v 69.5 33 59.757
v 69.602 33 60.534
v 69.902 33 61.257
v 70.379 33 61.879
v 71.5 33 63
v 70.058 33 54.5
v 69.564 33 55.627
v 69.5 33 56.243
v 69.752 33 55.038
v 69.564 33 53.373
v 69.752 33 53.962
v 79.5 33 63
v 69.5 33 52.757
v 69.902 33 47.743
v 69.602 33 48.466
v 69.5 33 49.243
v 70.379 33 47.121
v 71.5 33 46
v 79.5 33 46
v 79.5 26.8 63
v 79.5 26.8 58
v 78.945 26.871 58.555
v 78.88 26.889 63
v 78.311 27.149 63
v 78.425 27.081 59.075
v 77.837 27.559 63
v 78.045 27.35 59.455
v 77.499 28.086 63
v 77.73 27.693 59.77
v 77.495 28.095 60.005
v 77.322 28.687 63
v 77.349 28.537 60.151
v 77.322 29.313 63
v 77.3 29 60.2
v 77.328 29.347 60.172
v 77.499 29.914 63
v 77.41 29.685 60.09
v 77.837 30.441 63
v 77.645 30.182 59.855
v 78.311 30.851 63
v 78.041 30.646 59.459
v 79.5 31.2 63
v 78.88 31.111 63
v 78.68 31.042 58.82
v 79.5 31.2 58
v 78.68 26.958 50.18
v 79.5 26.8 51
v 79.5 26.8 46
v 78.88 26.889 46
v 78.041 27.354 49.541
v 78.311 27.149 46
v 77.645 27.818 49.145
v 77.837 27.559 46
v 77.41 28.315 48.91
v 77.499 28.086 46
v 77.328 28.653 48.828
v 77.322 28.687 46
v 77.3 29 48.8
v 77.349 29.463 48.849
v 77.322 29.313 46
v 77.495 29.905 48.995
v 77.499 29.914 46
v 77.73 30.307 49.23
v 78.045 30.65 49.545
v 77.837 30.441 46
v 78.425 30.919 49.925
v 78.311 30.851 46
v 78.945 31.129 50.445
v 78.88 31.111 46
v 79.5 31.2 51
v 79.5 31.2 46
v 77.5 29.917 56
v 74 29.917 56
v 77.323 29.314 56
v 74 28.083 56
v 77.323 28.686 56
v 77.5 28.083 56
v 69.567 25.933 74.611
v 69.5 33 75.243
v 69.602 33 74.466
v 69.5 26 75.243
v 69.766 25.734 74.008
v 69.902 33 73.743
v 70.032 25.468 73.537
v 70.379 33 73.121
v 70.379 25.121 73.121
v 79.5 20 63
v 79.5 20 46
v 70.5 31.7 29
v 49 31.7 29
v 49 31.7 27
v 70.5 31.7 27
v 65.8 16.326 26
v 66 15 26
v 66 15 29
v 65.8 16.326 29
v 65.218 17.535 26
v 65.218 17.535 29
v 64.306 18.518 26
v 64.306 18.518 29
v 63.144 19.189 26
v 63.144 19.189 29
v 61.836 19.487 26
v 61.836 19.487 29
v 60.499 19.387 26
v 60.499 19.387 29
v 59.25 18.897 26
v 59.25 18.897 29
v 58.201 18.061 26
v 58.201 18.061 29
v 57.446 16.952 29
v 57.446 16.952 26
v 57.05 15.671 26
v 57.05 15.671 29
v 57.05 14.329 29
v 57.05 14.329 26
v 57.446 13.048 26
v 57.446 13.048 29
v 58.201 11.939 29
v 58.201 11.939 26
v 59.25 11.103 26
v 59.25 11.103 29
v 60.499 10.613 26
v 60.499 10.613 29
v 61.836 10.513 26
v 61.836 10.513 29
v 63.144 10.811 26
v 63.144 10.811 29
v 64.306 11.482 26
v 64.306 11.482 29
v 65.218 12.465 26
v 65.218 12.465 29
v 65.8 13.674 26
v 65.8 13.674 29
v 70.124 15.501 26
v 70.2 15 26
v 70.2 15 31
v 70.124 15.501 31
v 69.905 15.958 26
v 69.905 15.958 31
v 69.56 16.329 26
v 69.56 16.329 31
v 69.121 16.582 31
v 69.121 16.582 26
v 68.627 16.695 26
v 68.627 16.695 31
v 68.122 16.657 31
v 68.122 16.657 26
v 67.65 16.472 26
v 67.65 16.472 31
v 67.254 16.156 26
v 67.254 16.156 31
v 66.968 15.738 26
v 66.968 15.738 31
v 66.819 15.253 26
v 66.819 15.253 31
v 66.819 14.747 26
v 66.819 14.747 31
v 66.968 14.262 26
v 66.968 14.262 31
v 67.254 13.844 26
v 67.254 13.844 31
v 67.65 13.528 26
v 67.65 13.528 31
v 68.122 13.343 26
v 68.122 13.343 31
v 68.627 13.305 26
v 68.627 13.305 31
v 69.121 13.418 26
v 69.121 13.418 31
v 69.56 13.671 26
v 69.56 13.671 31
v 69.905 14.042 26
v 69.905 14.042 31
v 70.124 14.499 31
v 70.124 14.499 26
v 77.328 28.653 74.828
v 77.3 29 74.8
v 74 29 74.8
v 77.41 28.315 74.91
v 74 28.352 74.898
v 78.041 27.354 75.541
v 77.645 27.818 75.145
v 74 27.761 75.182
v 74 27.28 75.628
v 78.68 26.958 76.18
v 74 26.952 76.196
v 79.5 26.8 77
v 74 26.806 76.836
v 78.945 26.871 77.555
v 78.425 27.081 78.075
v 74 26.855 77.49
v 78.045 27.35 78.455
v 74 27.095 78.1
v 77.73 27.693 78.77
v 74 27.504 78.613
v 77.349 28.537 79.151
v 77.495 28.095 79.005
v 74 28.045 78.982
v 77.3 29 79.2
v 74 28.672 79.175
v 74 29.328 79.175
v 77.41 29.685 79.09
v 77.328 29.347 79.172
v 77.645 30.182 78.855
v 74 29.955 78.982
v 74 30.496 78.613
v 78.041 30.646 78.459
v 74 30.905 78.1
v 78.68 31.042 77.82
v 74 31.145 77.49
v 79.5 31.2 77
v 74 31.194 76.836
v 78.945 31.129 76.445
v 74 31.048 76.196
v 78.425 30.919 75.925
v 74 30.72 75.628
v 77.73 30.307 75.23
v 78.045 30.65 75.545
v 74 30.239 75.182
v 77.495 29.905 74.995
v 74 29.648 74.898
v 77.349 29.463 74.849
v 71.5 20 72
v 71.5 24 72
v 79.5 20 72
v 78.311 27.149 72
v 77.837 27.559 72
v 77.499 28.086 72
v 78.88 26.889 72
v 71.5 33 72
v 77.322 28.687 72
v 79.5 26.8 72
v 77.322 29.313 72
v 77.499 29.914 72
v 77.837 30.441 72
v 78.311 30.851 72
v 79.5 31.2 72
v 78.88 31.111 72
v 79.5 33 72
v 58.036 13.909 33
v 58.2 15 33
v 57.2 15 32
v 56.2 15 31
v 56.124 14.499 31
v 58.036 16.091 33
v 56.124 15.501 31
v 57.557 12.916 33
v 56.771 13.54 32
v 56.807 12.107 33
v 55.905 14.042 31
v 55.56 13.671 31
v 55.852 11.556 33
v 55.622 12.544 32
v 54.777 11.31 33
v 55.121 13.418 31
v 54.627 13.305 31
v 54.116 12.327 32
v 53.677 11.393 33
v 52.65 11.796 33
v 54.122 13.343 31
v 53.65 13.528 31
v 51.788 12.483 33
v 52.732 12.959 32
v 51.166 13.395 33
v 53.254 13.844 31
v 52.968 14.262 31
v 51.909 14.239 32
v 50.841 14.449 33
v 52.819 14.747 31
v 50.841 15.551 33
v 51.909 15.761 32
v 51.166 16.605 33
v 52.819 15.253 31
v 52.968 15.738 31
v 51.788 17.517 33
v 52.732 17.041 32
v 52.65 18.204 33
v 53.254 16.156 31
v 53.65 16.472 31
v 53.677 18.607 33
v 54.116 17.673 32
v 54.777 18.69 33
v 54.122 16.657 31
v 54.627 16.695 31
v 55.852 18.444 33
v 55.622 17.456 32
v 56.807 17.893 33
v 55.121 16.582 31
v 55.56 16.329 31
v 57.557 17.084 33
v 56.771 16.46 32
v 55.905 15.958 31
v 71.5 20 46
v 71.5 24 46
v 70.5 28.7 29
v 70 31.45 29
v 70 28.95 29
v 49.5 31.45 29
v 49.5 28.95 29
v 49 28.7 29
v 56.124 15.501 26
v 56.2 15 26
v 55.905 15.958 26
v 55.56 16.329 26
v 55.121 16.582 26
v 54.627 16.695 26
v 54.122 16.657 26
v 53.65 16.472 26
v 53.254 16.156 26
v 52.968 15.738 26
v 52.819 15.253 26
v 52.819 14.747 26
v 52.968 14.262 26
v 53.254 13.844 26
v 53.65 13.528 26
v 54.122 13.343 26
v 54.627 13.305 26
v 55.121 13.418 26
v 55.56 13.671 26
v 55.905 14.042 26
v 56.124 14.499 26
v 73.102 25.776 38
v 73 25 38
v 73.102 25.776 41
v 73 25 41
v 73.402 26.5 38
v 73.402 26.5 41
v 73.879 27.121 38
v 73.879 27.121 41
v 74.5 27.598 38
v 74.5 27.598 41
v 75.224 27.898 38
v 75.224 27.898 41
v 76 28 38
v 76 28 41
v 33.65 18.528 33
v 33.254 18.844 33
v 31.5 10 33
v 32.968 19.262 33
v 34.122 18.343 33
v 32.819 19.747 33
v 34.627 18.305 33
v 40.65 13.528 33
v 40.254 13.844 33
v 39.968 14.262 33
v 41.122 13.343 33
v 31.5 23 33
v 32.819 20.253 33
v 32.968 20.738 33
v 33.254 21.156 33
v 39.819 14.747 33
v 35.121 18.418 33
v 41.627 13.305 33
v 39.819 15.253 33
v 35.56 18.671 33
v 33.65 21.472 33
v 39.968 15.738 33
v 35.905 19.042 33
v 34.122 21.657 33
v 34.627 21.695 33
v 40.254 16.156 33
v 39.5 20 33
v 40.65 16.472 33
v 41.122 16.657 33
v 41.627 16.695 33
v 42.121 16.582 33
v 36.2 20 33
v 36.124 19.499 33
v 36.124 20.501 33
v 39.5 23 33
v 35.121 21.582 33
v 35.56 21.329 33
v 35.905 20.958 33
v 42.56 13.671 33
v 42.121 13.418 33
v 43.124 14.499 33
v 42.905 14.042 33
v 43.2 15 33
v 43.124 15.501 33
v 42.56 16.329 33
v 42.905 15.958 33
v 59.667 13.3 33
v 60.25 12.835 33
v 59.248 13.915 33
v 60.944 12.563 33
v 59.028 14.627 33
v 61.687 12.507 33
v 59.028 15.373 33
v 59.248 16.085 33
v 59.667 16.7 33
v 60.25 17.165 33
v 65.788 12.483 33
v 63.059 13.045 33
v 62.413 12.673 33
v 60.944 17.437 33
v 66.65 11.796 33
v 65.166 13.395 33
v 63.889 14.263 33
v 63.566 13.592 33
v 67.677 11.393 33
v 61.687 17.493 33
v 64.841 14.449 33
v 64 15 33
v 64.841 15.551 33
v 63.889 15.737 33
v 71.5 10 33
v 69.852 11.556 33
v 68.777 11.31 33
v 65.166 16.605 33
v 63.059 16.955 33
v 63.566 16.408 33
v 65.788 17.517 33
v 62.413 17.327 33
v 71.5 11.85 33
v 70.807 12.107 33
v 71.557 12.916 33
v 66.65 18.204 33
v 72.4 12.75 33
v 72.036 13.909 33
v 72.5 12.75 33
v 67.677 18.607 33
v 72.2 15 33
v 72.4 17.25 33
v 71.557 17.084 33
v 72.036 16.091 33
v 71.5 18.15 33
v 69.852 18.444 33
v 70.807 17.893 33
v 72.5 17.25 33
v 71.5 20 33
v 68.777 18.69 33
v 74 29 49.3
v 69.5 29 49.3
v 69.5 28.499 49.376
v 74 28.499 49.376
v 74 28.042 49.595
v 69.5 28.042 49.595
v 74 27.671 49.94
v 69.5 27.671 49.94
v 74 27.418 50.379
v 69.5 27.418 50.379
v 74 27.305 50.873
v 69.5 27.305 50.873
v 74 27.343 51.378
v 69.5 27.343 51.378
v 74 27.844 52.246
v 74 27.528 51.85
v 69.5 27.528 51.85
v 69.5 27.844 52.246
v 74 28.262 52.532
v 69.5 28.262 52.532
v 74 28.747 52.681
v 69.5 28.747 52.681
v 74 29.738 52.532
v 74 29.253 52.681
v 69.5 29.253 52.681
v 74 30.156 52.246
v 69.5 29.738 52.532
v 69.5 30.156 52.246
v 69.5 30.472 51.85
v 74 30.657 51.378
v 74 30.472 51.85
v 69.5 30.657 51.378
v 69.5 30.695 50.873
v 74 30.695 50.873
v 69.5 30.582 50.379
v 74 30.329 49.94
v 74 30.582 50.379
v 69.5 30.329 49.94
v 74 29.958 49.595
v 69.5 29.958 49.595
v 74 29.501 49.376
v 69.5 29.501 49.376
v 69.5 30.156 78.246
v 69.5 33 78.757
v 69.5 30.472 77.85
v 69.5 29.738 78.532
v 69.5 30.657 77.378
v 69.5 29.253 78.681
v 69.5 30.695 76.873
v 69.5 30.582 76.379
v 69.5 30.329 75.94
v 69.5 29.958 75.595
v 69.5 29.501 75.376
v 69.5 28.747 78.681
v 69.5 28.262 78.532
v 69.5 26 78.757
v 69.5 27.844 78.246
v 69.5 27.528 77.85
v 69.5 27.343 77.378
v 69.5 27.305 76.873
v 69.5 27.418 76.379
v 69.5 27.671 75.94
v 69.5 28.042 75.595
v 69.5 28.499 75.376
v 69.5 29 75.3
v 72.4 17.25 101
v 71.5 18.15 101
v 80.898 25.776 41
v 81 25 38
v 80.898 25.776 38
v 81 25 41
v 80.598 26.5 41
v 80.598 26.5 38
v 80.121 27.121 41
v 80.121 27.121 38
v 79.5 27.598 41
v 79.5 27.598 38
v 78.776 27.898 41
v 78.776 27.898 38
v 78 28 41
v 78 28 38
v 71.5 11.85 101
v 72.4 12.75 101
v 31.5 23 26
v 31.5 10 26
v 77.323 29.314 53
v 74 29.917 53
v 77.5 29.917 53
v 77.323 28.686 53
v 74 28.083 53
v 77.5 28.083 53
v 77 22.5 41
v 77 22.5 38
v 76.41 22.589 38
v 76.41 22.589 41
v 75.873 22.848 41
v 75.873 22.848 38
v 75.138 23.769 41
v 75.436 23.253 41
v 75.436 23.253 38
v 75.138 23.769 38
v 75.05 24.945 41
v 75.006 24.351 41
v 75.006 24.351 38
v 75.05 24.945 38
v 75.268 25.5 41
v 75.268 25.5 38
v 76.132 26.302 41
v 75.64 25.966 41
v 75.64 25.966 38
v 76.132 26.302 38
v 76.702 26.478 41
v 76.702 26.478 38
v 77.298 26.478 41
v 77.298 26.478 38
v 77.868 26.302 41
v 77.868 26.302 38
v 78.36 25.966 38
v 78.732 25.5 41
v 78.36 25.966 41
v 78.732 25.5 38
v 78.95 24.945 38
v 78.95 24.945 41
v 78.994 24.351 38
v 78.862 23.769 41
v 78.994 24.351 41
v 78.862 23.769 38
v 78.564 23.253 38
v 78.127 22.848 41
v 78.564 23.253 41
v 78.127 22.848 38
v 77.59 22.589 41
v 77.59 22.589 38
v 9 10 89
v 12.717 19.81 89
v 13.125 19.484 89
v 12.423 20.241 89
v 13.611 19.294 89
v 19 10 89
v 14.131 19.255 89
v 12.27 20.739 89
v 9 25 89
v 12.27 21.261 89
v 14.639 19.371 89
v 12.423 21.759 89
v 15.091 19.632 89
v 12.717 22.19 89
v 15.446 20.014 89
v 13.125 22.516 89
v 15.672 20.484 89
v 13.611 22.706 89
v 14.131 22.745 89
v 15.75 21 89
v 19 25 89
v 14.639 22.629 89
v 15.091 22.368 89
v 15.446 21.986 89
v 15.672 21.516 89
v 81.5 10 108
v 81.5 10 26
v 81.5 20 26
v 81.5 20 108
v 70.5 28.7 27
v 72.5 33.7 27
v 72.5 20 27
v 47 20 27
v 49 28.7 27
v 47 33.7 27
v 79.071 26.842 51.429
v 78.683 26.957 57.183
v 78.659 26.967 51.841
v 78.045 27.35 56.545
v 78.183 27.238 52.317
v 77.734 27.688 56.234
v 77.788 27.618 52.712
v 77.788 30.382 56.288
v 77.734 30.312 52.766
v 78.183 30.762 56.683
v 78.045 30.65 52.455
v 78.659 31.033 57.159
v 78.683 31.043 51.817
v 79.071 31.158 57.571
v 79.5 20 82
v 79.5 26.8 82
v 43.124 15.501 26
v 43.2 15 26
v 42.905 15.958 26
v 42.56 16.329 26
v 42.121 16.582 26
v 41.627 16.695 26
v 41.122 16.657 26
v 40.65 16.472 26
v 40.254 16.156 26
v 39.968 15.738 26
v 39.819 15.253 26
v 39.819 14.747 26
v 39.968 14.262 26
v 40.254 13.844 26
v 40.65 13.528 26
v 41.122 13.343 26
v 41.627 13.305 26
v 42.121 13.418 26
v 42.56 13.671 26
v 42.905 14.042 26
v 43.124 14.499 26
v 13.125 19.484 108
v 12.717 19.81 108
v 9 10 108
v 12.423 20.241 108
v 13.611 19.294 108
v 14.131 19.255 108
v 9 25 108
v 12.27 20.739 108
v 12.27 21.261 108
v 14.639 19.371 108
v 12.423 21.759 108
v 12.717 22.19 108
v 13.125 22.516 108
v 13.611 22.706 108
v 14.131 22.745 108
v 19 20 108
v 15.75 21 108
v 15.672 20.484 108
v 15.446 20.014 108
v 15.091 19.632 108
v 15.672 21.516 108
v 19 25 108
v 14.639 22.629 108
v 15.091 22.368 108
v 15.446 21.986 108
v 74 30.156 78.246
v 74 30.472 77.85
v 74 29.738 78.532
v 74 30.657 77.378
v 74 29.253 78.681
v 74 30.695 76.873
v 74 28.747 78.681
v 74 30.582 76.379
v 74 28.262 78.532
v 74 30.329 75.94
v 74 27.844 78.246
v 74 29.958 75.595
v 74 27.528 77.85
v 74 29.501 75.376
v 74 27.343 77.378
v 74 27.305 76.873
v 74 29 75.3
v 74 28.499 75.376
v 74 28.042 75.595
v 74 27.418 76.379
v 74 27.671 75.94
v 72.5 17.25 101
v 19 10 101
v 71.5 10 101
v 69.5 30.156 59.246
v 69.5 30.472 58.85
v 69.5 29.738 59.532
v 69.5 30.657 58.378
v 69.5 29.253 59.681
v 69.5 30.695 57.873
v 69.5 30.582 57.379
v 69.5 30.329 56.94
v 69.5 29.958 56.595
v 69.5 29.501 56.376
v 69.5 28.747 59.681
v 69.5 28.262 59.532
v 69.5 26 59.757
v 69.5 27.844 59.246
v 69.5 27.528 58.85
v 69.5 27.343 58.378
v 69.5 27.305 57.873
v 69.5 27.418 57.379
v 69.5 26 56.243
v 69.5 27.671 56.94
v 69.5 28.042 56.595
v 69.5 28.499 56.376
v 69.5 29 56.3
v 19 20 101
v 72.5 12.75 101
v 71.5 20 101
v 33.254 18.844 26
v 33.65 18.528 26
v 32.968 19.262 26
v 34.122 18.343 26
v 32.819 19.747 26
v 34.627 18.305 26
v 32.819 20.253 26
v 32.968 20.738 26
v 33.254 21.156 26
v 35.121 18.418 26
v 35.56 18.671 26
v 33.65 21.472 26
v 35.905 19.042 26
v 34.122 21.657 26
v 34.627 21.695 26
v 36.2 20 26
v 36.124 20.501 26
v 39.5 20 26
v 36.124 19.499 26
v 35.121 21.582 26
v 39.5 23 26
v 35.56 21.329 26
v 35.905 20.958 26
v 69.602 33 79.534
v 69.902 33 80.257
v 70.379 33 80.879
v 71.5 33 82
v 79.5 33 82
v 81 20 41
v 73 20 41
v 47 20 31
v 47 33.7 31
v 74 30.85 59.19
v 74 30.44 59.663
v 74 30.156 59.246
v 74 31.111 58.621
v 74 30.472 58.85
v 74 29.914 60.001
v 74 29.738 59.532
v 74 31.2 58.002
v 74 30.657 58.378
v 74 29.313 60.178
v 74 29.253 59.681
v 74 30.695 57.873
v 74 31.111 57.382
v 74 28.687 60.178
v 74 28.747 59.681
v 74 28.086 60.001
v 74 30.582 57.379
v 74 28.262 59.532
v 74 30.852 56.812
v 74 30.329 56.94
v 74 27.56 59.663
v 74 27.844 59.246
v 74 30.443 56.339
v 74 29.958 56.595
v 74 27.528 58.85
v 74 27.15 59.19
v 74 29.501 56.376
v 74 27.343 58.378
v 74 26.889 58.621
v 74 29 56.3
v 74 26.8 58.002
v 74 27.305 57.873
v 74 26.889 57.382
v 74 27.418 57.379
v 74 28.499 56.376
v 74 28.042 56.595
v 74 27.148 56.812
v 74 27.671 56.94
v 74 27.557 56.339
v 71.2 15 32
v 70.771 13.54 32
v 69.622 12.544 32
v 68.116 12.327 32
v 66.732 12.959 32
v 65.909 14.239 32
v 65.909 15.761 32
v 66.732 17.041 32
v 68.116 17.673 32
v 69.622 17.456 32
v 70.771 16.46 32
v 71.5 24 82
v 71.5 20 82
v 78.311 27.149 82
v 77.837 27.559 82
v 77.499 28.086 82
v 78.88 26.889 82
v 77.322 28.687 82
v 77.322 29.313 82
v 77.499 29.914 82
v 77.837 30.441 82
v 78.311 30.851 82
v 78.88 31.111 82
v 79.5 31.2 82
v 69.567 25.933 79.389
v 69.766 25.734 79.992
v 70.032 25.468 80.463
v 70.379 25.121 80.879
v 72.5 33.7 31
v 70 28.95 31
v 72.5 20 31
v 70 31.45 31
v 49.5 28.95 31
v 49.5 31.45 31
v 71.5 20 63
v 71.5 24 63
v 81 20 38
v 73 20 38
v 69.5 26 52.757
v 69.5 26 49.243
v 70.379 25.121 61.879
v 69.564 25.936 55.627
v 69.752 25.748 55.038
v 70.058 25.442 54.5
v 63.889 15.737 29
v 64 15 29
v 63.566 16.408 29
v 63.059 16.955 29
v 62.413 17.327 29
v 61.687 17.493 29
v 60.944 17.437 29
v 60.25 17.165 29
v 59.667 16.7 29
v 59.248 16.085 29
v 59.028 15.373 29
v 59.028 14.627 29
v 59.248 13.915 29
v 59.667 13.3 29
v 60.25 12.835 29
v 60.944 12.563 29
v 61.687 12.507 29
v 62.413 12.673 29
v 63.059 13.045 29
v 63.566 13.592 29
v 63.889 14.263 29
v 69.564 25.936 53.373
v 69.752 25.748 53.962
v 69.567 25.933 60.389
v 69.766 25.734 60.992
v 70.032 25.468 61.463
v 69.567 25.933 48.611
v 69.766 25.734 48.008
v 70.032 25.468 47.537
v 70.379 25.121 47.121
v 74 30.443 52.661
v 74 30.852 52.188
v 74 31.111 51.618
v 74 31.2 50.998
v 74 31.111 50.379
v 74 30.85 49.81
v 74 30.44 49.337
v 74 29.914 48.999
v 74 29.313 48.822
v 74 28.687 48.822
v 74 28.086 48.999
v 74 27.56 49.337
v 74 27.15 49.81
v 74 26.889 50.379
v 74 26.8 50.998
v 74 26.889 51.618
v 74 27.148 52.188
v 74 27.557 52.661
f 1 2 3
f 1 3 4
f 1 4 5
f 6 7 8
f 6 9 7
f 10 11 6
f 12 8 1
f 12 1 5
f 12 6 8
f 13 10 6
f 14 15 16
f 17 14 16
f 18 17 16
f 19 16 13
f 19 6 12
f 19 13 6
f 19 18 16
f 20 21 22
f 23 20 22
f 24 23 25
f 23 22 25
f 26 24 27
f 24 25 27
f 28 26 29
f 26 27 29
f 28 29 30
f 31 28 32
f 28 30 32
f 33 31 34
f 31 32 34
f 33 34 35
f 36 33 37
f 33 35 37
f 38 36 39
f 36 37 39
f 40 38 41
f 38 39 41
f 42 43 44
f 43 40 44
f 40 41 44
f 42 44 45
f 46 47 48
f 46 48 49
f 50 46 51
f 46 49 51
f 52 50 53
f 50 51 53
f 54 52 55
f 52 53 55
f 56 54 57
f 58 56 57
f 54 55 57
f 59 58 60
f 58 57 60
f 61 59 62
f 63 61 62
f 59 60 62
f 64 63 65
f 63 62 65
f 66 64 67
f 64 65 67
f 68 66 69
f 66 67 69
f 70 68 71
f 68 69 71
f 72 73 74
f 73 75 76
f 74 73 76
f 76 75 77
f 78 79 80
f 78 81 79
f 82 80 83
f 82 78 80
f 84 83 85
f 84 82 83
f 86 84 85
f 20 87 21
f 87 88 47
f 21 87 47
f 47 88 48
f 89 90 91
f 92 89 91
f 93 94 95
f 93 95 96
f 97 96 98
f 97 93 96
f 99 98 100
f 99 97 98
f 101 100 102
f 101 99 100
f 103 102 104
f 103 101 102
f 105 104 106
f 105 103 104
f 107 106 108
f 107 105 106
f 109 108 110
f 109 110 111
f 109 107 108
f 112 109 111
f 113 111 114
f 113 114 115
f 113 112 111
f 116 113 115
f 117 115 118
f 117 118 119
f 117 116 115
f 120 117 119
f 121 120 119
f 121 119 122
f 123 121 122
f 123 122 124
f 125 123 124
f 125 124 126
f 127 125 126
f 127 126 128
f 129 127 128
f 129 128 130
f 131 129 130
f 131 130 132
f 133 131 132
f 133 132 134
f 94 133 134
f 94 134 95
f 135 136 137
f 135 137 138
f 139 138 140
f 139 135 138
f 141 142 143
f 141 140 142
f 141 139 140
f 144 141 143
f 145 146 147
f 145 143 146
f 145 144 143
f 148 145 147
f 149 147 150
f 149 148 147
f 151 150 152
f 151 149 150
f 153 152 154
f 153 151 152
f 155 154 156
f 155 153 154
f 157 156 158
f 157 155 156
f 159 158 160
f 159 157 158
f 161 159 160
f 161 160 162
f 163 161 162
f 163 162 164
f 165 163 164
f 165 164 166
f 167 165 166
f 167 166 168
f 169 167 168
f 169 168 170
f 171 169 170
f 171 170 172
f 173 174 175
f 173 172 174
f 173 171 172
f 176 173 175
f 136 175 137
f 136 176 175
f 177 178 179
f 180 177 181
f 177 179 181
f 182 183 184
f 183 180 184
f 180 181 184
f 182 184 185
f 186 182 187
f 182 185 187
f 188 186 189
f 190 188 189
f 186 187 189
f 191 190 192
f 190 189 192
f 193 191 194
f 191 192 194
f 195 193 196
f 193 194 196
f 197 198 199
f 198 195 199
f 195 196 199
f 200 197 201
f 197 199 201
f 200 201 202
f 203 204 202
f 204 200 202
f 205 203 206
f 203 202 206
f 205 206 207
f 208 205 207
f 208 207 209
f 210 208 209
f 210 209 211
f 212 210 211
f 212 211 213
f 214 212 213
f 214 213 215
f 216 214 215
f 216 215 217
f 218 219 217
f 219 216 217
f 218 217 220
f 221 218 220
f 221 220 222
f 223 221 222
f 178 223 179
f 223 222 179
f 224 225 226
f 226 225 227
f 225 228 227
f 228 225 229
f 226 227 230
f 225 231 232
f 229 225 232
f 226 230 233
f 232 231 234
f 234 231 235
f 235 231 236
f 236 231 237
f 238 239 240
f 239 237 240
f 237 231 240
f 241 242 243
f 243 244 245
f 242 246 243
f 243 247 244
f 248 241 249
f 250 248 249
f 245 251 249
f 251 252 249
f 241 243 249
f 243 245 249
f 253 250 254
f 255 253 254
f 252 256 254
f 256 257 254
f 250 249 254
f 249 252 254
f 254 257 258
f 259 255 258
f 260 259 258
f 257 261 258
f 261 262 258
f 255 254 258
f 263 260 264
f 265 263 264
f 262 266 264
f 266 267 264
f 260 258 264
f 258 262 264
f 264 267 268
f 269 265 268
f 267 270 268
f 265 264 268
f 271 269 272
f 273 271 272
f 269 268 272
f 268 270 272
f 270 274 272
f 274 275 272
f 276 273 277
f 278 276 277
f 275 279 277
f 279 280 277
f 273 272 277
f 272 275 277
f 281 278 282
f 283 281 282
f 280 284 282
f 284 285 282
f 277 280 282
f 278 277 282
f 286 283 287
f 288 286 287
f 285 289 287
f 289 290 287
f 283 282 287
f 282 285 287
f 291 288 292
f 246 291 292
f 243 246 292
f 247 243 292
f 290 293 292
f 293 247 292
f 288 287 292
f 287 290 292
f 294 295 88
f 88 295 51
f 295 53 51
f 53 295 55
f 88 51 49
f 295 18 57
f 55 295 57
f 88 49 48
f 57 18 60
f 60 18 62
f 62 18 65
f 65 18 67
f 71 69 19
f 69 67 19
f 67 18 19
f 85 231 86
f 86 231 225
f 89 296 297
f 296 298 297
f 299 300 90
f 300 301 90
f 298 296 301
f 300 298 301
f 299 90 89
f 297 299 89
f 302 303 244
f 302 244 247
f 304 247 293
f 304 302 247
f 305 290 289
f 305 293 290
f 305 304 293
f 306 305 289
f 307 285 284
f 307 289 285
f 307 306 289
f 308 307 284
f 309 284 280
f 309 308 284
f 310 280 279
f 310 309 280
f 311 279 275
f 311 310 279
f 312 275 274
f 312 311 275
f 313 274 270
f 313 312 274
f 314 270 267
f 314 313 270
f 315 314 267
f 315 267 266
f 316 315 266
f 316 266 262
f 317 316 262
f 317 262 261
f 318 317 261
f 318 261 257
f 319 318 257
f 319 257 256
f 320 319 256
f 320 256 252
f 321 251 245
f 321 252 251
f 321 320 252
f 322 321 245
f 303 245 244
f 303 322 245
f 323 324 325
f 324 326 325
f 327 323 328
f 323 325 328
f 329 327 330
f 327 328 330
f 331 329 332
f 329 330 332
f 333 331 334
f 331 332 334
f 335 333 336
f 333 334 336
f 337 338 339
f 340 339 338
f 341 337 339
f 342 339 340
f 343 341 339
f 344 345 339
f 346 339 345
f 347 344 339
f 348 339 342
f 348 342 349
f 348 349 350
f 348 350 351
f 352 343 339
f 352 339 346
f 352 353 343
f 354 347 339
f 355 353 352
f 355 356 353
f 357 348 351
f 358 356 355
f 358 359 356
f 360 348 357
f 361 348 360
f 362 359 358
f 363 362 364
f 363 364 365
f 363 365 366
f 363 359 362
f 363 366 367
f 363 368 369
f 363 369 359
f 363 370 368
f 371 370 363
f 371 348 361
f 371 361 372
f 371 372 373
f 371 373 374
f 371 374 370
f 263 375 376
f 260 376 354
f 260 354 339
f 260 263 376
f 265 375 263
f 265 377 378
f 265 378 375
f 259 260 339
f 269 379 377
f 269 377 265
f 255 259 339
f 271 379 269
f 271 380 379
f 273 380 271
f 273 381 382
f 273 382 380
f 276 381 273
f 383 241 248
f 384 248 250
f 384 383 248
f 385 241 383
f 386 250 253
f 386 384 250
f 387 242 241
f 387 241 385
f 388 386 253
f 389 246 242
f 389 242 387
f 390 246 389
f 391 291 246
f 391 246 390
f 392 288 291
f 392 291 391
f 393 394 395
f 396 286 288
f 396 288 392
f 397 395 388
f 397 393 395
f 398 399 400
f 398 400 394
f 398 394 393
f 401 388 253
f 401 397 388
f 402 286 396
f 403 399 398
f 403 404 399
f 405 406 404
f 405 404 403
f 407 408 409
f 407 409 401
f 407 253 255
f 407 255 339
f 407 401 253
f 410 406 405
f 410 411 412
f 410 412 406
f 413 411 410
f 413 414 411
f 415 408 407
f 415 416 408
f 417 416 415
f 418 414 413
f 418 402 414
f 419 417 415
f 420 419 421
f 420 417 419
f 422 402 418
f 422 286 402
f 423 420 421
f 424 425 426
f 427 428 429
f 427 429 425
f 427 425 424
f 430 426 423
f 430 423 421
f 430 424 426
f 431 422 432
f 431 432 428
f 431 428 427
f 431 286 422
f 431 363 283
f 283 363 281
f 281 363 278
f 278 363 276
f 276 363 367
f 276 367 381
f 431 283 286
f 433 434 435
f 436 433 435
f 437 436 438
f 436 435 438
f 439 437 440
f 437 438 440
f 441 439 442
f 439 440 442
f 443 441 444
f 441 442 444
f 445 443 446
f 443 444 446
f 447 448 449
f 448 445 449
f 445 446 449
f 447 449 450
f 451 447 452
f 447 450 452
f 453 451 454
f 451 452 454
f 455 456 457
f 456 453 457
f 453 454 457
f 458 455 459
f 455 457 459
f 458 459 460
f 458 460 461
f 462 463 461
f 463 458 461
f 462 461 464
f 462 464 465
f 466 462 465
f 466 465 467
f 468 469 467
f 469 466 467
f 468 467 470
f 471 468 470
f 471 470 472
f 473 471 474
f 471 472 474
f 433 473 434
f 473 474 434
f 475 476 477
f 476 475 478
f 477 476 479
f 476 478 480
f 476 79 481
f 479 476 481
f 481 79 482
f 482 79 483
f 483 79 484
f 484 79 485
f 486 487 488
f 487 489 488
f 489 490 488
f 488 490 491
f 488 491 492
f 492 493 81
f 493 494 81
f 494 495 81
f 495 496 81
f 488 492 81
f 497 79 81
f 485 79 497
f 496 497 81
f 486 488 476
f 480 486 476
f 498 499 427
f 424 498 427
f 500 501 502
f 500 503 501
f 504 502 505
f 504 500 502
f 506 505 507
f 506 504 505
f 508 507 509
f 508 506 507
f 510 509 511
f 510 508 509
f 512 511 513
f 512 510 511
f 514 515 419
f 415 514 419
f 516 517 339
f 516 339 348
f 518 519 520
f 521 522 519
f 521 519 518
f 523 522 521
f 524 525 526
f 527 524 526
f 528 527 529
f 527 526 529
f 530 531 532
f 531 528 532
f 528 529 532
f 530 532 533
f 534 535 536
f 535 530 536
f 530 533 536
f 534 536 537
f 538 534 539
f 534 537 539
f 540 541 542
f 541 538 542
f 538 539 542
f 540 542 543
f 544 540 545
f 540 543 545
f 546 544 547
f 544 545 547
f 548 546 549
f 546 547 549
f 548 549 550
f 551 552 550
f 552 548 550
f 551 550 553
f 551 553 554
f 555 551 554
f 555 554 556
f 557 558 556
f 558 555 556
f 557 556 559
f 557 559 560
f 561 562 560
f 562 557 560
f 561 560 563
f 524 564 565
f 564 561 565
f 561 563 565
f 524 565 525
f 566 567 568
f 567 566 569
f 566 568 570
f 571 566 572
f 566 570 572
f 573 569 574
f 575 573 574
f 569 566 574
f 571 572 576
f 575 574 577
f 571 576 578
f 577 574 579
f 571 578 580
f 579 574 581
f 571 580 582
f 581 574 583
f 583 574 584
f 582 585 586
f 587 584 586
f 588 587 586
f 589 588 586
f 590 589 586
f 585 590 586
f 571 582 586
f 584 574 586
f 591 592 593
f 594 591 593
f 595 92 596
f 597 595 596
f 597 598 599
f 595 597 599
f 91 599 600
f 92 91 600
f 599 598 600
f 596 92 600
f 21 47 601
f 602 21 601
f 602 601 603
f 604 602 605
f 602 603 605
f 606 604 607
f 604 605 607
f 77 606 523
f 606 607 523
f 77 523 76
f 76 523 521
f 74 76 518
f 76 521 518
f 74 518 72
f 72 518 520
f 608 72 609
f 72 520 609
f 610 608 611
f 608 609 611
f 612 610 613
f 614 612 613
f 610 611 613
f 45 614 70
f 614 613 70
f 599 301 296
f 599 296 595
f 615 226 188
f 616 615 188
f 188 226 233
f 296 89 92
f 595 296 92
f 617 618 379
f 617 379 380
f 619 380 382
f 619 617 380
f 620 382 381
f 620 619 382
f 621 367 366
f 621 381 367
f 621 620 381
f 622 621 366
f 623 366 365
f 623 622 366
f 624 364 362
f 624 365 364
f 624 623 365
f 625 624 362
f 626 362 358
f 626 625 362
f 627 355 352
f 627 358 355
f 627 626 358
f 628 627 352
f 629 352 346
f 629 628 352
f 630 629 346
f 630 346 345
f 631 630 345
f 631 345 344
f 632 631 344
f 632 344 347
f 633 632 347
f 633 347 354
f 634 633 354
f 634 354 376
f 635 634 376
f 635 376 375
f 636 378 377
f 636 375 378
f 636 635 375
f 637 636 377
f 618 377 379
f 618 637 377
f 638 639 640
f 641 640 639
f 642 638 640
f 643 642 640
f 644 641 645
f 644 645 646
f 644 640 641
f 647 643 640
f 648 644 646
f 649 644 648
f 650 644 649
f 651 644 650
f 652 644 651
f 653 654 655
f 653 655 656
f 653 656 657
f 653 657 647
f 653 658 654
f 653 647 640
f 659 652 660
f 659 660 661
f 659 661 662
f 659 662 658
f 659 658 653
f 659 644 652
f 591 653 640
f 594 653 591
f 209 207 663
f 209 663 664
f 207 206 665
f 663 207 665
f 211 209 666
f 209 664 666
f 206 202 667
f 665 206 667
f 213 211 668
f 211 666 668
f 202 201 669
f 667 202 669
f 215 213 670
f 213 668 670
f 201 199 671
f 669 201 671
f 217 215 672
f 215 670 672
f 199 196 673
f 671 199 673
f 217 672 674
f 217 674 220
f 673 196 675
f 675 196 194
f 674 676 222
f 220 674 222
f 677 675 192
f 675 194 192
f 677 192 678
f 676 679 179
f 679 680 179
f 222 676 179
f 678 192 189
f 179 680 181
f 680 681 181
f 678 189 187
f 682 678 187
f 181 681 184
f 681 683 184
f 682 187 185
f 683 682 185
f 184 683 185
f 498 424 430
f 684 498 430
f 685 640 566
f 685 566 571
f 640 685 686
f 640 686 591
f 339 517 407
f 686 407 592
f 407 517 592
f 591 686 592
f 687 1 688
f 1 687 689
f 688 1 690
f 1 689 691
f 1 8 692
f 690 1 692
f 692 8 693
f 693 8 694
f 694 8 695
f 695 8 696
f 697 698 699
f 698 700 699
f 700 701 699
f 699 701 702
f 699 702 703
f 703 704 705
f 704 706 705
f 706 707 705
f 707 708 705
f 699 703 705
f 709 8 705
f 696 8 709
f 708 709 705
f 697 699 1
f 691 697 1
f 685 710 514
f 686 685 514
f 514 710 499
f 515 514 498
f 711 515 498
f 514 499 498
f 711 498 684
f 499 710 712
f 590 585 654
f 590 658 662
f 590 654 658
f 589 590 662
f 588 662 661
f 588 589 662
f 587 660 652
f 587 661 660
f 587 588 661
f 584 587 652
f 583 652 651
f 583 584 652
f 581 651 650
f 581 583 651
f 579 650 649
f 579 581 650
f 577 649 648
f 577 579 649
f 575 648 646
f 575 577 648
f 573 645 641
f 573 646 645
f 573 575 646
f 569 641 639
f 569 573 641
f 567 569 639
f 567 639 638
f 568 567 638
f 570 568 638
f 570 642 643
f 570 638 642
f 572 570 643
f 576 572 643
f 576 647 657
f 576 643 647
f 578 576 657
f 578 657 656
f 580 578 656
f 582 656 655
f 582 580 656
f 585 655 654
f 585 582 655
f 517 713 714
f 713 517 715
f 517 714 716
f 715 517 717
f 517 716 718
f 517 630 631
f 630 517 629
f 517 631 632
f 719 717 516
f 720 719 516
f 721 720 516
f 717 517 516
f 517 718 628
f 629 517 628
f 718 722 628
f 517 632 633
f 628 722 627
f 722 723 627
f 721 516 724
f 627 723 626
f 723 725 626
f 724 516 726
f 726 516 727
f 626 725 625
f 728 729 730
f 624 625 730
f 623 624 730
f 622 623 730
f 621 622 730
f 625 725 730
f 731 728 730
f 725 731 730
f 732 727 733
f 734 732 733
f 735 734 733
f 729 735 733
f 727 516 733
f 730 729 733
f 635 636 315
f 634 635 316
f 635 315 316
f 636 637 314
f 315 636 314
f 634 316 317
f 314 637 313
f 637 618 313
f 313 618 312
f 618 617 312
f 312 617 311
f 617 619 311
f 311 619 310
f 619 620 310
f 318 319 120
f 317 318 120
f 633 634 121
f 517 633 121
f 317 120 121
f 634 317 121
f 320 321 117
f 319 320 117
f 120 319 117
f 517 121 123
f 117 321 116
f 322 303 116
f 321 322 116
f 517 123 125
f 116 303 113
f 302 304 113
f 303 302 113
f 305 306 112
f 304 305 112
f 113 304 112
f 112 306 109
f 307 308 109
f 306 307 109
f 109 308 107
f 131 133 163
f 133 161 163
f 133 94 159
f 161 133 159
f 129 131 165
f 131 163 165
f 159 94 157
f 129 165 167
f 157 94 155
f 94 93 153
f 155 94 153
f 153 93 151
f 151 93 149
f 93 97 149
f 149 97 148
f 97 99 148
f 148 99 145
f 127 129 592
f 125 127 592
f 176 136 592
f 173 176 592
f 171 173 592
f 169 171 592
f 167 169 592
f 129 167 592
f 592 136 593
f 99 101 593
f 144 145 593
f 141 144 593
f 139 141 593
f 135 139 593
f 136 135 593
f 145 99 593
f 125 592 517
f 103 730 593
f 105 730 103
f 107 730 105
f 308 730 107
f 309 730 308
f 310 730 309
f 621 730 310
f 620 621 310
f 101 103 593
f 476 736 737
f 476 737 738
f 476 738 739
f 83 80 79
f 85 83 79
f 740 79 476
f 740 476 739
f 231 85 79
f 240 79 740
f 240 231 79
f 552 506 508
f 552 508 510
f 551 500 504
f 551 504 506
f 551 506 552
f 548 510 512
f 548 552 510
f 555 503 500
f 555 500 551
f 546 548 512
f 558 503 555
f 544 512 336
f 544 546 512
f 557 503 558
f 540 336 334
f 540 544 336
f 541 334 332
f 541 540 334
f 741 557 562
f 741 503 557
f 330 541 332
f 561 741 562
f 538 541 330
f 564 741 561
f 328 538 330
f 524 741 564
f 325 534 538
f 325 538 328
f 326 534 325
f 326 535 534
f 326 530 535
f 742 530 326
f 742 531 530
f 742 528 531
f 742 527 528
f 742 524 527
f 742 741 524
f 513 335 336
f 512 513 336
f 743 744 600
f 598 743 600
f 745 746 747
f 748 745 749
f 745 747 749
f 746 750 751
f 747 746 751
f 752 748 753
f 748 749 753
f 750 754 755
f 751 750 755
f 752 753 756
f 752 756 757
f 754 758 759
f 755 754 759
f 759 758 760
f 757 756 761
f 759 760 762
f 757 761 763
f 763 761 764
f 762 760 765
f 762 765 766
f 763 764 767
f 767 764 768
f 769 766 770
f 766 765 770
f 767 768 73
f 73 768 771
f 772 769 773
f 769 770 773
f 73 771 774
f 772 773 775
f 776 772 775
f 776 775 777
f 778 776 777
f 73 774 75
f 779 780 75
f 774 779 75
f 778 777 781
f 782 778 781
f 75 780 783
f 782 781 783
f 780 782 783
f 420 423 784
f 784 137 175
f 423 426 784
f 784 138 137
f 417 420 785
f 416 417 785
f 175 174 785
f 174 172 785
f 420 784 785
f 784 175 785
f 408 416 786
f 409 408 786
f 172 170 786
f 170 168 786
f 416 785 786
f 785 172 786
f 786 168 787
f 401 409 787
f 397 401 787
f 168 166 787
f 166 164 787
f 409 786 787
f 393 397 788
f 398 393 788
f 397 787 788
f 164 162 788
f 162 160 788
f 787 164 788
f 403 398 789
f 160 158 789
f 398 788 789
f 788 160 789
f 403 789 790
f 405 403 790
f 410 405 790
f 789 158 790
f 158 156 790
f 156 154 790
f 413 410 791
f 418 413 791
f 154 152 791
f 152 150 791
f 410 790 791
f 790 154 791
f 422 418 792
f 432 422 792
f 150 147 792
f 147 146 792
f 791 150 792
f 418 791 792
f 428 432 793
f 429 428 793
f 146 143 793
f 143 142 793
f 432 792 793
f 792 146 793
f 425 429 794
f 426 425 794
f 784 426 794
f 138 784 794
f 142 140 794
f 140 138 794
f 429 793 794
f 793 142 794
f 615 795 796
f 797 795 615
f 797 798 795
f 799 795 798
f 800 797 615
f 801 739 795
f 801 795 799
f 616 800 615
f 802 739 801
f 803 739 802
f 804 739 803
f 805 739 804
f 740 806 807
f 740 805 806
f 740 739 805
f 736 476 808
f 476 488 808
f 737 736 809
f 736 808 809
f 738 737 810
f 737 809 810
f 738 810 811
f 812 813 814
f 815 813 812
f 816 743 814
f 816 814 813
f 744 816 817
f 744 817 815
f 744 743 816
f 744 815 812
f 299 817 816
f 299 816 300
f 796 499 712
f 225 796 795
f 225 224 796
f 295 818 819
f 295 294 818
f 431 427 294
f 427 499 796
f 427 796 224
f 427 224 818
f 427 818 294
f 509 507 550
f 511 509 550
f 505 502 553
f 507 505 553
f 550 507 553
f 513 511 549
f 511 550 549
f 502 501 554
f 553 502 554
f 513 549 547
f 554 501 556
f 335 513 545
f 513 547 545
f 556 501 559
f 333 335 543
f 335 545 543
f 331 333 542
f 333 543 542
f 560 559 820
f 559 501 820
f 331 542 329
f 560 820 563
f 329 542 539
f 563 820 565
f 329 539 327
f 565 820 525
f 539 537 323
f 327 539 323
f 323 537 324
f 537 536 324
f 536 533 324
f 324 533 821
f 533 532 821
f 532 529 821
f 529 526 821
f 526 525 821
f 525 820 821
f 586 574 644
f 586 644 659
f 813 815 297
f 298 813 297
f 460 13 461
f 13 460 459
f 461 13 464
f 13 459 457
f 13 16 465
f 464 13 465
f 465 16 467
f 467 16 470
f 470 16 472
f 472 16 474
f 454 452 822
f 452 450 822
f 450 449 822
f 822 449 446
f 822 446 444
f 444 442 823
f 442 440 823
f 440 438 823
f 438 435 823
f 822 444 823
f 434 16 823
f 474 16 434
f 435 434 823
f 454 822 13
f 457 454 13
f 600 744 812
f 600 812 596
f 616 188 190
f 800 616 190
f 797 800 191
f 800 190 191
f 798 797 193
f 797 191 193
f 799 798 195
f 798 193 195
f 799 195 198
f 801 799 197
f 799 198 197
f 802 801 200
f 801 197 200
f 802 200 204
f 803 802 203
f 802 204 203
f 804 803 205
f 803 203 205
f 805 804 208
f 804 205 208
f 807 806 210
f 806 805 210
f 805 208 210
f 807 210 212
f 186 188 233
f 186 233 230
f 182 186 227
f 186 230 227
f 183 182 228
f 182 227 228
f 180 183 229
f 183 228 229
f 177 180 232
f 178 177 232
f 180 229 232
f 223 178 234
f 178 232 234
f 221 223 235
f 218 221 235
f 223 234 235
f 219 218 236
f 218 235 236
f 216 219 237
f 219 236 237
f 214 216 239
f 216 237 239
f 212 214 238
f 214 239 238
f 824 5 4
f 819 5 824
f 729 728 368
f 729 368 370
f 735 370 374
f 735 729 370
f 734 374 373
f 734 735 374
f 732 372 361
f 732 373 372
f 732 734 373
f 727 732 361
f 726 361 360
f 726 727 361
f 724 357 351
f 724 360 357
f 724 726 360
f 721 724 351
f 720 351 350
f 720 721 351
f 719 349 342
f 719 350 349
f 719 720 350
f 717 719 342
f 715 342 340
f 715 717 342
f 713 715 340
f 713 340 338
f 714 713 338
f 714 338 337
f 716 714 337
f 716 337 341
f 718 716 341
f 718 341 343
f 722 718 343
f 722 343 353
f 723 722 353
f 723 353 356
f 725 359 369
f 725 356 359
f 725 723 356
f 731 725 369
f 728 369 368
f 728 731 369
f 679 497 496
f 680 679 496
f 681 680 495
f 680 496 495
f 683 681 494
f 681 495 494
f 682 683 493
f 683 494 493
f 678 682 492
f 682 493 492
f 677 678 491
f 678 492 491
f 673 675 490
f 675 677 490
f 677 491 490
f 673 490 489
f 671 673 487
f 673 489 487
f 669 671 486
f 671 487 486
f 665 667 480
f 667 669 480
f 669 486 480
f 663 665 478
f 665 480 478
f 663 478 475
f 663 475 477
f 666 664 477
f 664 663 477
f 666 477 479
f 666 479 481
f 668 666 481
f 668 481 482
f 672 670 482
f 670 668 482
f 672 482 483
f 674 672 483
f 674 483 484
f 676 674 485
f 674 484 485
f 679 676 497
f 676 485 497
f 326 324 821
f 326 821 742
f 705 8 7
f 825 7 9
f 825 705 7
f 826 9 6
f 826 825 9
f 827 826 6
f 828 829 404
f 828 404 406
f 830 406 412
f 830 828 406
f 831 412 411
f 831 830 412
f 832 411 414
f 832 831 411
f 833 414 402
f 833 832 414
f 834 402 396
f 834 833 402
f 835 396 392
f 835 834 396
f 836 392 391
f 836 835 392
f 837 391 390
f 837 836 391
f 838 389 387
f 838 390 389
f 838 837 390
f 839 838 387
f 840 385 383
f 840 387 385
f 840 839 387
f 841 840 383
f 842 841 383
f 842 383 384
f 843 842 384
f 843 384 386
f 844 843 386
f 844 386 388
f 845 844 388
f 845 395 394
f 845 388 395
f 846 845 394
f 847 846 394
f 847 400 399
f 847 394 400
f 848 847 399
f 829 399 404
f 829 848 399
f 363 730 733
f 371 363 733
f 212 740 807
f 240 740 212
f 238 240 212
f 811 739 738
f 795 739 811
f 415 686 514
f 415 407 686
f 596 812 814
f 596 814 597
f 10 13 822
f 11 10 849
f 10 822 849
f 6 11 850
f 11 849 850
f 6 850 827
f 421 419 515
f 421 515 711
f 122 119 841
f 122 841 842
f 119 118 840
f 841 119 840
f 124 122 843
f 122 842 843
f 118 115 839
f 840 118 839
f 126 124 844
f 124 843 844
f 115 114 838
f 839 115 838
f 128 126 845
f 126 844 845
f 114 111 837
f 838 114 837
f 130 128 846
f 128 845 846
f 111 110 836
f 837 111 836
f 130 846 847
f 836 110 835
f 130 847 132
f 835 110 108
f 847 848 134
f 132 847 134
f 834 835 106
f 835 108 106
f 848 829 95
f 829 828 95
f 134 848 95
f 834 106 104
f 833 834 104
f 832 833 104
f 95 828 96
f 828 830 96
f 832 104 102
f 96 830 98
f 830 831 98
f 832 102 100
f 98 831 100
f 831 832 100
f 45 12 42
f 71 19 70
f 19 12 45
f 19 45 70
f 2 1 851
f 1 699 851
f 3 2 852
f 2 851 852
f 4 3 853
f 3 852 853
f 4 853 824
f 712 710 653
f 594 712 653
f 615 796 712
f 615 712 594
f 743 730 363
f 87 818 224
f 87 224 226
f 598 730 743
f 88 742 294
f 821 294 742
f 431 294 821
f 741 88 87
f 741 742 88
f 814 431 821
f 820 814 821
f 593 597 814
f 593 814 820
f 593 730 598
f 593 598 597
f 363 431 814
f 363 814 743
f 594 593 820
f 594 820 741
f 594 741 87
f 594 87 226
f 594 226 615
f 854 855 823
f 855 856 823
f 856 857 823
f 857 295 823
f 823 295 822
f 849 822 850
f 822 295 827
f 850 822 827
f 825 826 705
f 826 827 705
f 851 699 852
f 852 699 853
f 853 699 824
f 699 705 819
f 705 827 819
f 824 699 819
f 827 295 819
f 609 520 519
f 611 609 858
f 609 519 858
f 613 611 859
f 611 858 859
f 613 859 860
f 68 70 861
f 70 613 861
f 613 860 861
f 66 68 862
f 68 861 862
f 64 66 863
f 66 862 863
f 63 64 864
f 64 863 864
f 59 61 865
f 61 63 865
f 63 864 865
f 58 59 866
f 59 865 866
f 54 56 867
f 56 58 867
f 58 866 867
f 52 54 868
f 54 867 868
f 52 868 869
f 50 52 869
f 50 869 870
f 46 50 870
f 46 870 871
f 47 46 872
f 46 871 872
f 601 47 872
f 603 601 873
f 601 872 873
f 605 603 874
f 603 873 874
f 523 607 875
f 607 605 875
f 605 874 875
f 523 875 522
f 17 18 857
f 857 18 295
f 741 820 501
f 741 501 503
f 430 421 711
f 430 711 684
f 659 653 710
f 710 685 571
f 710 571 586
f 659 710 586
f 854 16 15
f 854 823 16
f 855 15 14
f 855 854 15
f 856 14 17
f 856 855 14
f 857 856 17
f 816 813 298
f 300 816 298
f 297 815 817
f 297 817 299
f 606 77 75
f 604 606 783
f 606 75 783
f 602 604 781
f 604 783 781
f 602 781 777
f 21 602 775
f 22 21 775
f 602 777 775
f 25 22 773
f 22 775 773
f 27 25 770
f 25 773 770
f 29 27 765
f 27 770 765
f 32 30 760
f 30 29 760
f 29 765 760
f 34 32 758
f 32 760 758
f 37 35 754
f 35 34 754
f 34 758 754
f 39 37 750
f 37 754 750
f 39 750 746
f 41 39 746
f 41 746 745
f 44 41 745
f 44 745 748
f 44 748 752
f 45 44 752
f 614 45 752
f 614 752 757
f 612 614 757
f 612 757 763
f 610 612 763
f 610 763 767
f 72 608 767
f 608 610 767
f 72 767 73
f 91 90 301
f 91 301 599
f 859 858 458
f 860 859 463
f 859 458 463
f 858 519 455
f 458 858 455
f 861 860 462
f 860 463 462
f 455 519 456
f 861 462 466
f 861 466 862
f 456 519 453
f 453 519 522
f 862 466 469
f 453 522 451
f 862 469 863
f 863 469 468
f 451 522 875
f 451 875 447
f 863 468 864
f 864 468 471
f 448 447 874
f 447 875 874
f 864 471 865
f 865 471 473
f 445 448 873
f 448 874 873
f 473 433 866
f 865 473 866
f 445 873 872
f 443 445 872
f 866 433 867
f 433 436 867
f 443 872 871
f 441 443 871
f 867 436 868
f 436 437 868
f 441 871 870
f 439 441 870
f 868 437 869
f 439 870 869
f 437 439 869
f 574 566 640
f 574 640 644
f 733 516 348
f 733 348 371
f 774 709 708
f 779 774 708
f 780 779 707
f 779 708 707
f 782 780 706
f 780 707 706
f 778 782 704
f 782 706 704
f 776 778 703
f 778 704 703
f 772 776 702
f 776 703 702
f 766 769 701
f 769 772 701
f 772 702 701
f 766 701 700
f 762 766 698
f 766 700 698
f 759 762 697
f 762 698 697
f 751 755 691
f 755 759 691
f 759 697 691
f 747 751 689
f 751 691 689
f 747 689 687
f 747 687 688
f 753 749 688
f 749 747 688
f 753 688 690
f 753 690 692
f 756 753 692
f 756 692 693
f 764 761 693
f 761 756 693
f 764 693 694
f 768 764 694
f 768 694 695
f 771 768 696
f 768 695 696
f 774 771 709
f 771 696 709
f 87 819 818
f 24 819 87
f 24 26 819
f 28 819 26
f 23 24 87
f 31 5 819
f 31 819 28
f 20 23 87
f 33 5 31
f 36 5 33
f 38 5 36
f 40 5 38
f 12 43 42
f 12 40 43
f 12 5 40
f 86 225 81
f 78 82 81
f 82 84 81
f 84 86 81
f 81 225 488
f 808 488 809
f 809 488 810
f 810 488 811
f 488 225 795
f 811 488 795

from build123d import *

# Parameters (mm, degrees)
BOX001027045198_W       = 10
BOX001027045198_H       = 2.5
BOX001027045198_DEPTH   = 20.5
BOX001027045197_W       = 10
BOX001027045197_H       = 3
BOX001027045197_DEPTH   = 21.5
BOX001027045196_W       = 4
BOX001027045196_H       = 14
BOX001027045196_DEPTH   = 25.5
CUT238_PITCH_ANGLE      = 90
CYLINDER070_R           = 1.7
CYLINDER070_DEPTH       = 50
CYLINDER069_R           = 1.7
CYLINDER069_DEPTH       = 50
CYLINDER068_R           = 1.7
CYLINDER068_DEPTH       = 50
CYLINDER067_R           = 1.7
CYLINDER067_DEPTH       = 50
CYLINDER063_R           = 2.5
CYLINDER063_DEPTH       = 50
CYLINDER064_R           = 4.5
CYLINDER064_DEPTH       = 4
BOX035_W                = 50
BOX035_H                = 10
BOX035_DEPTH            = 7
BOX034_W                = 10
BOX034_H                = 4.5
BOX034_DEPTH            = 122
BOX033_W                = 10
BOX033_H                = 10
BOX033_DEPTH            = 80
CHAMFER_SIZE            = 0.9
BOX041_W                = 8
BOX041_H                = 5
BOX041_DEPTH            = 7
CHAMFER017_SIZE         = 2
CYLINDER273_R           = 2
CYLINDER273_DEPTH       = 10
CYLINDER273_PITCH_ANGLE = 90
BOX001027045201_W       = 3
BOX001027045201_H       = 8
BOX001027045201_DEPTH   = 8
FILLET047_R             = 3
CUT246_PITCH_ANGLE      = -90
CUT246_PLACEMENT_ANGLE  = 90
BOX001027045204_W       = 8
BOX001027045204_H       = 6
BOX001027045204_DEPTH   = 17
BOX001027045205_W       = 8
BOX001027045205_H       = 6
BOX001027045205_DEPTH   = 10
CYLINDER272_R           = 2.2
CYLINDER272_DEPTH       = 30
CYLINDER271_R           = 2.2
CYLINDER271_DEPTH       = 30
CYLINDER271_PITCH_ANGLE = 90
CYLINDER270_R           = 1.7
CYLINDER270_DEPTH       = 30
CYLINDER270_PITCH_ANGLE = 90
BOX001027045200_W       = 10
BOX001027045200_H       = 9
BOX001027045200_DEPTH   = 10
CHAMFER015_SIZE         = 2
CHAMFER016_SIZE         = 2
FILLET046_R             = 3
CYLINDER275_R           = 1.75
CYLINDER275_DEPTH       = 200
BOX001027045203_W       = 10
BOX001027045203_H       = 15
BOX001027045203_DEPTH   = 19
BOX001027045202_W       = 68
BOX001027045202_H       = 10
BOX001027045202_DEPTH   = 7


with BuildPart() as cube244:
    # Box001027045198 → Box001027045198 (new body)
    with BuildSketch(Plane(origin=(63, 7.25, -46.5), x_dir=(1, 0, 0), z_dir=(0, 0, 1))):
        with Locations((5, 1.25)):
            Rectangle(BOX001027045198_W, BOX001027045198_H)
    extrude(amount=BOX001027045198_DEPTH)


with BuildPart() as pin_strip_hole:
    # Box001027045197 → Box001027045197 (new body)
    with BuildSketch(Plane(origin=(70, 7, -47), x_dir=(1, 0, 0), z_dir=(0, 0, 1))):
        with Locations((5, 1.5)):
            Rectangle(BOX001027045197_W, BOX001027045197_H)
    extrude(amount=BOX001027045197_DEPTH)

    # Fusion112152: union Cube244
    add(cube244.part)


with BuildPart() as pin_strip_hole_1:
    # Fusion112152 placement: moved
    add(pin_strip_hole.part.moved(Location((2, 0, 0))))


with BuildPart() as pin_strip_bracket:
    # Box001027045196 → Box001027045196 (new body)
    with BuildSketch(Plane(origin=(70, -2, -49), x_dir=(1, 0, 0), z_dir=(0, 0, 1))):
        with Locations((2, 7)):
            Rectangle(BOX001027045196_W, BOX001027045196_H)
    extrude(amount=BOX001027045196_DEPTH)

    # Cut238: cut pin-strip-hole
    add(pin_strip_hole_1.part, mode=Mode.SUBTRACT)


with BuildPart() as pin_strip_bracket_1:
    # Cut238 pitch: moved
    add(pin_strip_bracket.part.rotate(Axis((0, 0, 0), (0, 1, 0)), CUT238_PITCH_ANGLE))


with BuildPart() as pin_strip_bracket_2:
    # Cut238 placement: moved
    add(pin_strip_bracket_1.part.moved(Location((96, 21.7, 101))))


with BuildPart() as m3_studding011:
    # Cylinder070 → Cylinder070 (new body)
    with BuildSketch(Plane(origin=(41.5, 15, -6), x_dir=(1, 0, 0), z_dir=(0, 0, 1))):
        Circle(CYLINDER070_R)
    extrude(amount=CYLINDER070_DEPTH)


with BuildPart() as m3_clearance001:
    # Cylinder069 → Cylinder069 (new body)
    with BuildSketch(Plane(origin=(34.5, 20, -6), x_dir=(1, 0, 0), z_dir=(0, 0, 1))):
        Circle(CYLINDER069_R)
    extrude(amount=CYLINDER069_DEPTH)

    # Fusion041: union m3-studding011
    add(m3_studding011.part)


with BuildPart() as m3_studding009:
    # Cylinder068 → Cylinder068 (new body)
    with BuildSketch(Plane(origin=(68.5, 15, 2), x_dir=(1, 0, 0), z_dir=(0, 0, 1))):
        Circle(CYLINDER068_R)
    extrude(amount=CYLINDER068_DEPTH)


with BuildPart() as m3_clearance004:
    # Cylinder067 → Cylinder067 (new body)
    with BuildSketch(Plane(origin=(54.5, 15, 2), x_dir=(1, 0, 0), z_dir=(0, 0, 1))):
        Circle(CYLINDER067_R)
    extrude(amount=CYLINDER067_DEPTH)

    # Fusion039: union m3-studding009
    add(m3_studding009.part)


with BuildPart() as nut_clearance:
    # Cylinder063 → Cylinder063 (new body)
    with BuildSketch(Plane(origin=(61.5, 15, 2), x_dir=(1, 0, 0), z_dir=(0, 0, 1))):
        Circle(CYLINDER063_R)
    extrude(amount=CYLINDER063_DEPTH)


with BuildPart() as bearing_nuts:
    # Cylinder064 → Cylinder064 (new body)
    with BuildSketch(Plane(origin=(61.5, 15, 25), x_dir=(1, 0, 0), z_dir=(0, 0, 1))):
        Circle(CYLINDER064_R)
    extrude(amount=CYLINDER064_DEPTH)

    # Fusion036: union nut-clearance
    add(nut_clearance.part)


with BuildPart() as cube032:
    # Box035 → Box035 (new body)
    with BuildSketch(Plane(origin=(31.5, 10, 26), x_dir=(1, 0, 0), z_dir=(0, 0, 1))):
        with Locations((25, 5)):
            Rectangle(BOX035_W, BOX035_H)
    extrude(amount=BOX035_DEPTH)


with BuildPart() as cube031:
    # Box034 → Box034 (new body)
    with BuildSketch(Plane(origin=(62.5, 12.75, 10), x_dir=(1, 0, 0), z_dir=(0, 0, 1))):
        with Locations((5, 2.25)):
            Rectangle(BOX034_W, BOX034_H)
    extrude(amount=BOX034_DEPTH)


with BuildPart() as track_blank_c:
    # Box033 → Box033 (new body)
    with BuildSketch(Plane(origin=(71.5, 10, 25), x_dir=(1, 0, 0), z_dir=(0, 0, 1))):
        with Locations((5, 5)):
            Rectangle(BOX033_W, BOX033_H)
    extrude(amount=BOX033_DEPTH)

    # Cut022: cut Cube031
    add(cube031.part, mode=Mode.SUBTRACT)

    # Chamfer
    chamfer_edges = [track_blank_c.edges().sort_by_distance(p)[0] for p in [
        (71.5, 12.75, 65),
        (71.5, 17.25, 65),
    ]]
    chamfer(chamfer_edges, length=CHAMFER_SIZE)


with BuildPart() as track_blank_c_1:
    # Chamfer placement: moved
    add(track_blank_c.part.moved(Location((0, 0, 3))))

    # Fusion035: union Cube032
    add(cube032.part)

    # Cut024: cut bearing-nuts
    add(bearing_nuts.part, mode=Mode.SUBTRACT)

    # Cut027: cut M3-clearance004
    add(m3_clearance004.part, mode=Mode.SUBTRACT)


with BuildPart() as track_blank_f:
    # Box041 → Box041 (new body)
    with BuildSketch(Plane(origin=(31.5, 18, 26), x_dir=(1, 0, 0), z_dir=(0, 0, 1))):
        with Locations((4, 2.5)):
            Rectangle(BOX041_W, BOX041_H)
    extrude(amount=BOX041_DEPTH)

    # Fusion040: union track-blank-c
    add(track_blank_c_1.part)

    # Cut029: cut M3-clearance001
    add(m3_clearance001.part, mode=Mode.SUBTRACT)

    # Chamfer017
    chamfer017_edges = [track_blank_f.edges().sort_by_distance(p)[0] for p in [
        (52.8, 15, 33),
        (66.8, 15, 33),
    ]]
    chamfer(chamfer017_edges, length=CHAMFER017_SIZE)


with BuildPart() as cylinder289:
    # Cylinder273 → Cylinder273 (new body)
    with BuildSketch(Plane.XY):
        Circle(CYLINDER273_R)
    extrude(amount=CYLINDER273_DEPTH)


with BuildPart() as cylinder289_1:
    # Cylinder273 pitch: moved
    add(cylinder289.part.rotate(Axis((0, 0, 0), (0, 1, 0)), CYLINDER273_PITCH_ANGLE))


with BuildPart() as cylinder289_2:
    # Cylinder273 placement: moved
    add(cylinder289_1.part.moved(Location((-3, 4, 4.5))))


with BuildPart() as cable_tie_holder:
    # Box001027045201 → Box001027045201 (new body)
    with BuildSketch(Plane.XY):
        with Locations((1.5, 4)):
            Rectangle(BOX001027045201_W, BOX001027045201_H)
    extrude(amount=BOX001027045201_DEPTH)

    # Fillet047
    fillet047_edges = [cable_tie_holder.edges().sort_by_distance(p)[0] for p in [
        (1.5, 0, 8),
        (1.5, 8, 8),
    ]]
    fillet(fillet047_edges, radius=FILLET047_R)

    # Cut246: cut Cylinder289
    add(cylinder289_2.part, mode=Mode.SUBTRACT)


with BuildPart() as cable_tie_holder_1:
    # Cut246 pitch: moved
    add(cable_tie_holder.part.rotate(Axis((0, 0, 0), (0, 1, 0)), CUT246_PITCH_ANGLE))


with BuildPart() as cable_tie_holder_2:
    # Cut246 placement: moved
    add(cable_tie_holder_1.part.moved(Location((81, 11, 27))).rotate(Axis((81, 11, 27), (0, 0, 1)), CUT246_PLACEMENT_ANGLE))


with BuildPart() as part_mirroring020:
    # Part__Mirroring020: instance of cable-tie-holder
    add(cable_tie_holder_2.part.mirror(Plane(origin=(0, 0, 0), x_dir=(1, 0, 0), z_dir=(0, 1, 0))))


with BuildPart() as part_mirroring020_1:
    # Part__Mirroring020 placement: moved
    add(part_mirroring020.part.moved(Location((0, 31, 11))))


with BuildPart() as cube250:
    # Box001027045204 → Box001027045204 (new body)
    with BuildSketch(Plane(origin=(71.5, 19, 46), x_dir=(1, 0, 0), z_dir=(0, 0, 1))):
        with Locations((4, 3)):
            Rectangle(BOX001027045204_W, BOX001027045204_H)
    extrude(amount=BOX001027045204_DEPTH)


with BuildPart() as cube251:
    # Box001027045205 → Box001027045205 (new body)
    with BuildSketch(Plane(origin=(71.5, 19, 72), x_dir=(1, 0, 0), z_dir=(0, 0, 1))):
        with Locations((4, 3)):
            Rectangle(BOX001027045205_W, BOX001027045205_H)
    extrude(amount=BOX001027045205_DEPTH)


with BuildPart() as cylinder288:
    # Cylinder272 → Cylinder272 (new body)
    with BuildSketch(Plane(origin=(79.5, 5, 48), x_dir=(1, 0, 0), z_dir=(0, 0, 1))):
        Circle(CYLINDER272_R)
    extrude(amount=CYLINDER272_DEPTH)


with BuildPart() as cylinder287:
    # Cylinder271 → Cylinder271 (new body)
    with BuildSketch(Plane.XY):
        Circle(CYLINDER271_R)
    extrude(amount=CYLINDER271_DEPTH)


with BuildPart() as cylinder287_1:
    # Cylinder271 pitch: moved
    add(cylinder287.part.rotate(Axis((0, 0, 0), (0, 1, 0)), CYLINDER271_PITCH_ANGLE))


with BuildPart() as cylinder287_2:
    # Cylinder271 placement: moved
    add(cylinder287_1.part.moved(Location((74, 5, 58))))


with BuildPart() as cylinder286:
    # Cylinder270 → Cylinder270 (new body)
    with BuildSketch(Plane.XY):
        Circle(CYLINDER270_R)
    extrude(amount=CYLINDER270_DEPTH)


with BuildPart() as cylinder286_1:
    # Cylinder270 pitch: moved
    add(cylinder286.part.rotate(Axis((0, 0, 0), (0, 1, 0)), CYLINDER270_PITCH_ANGLE))


with BuildPart() as cylinder286_2:
    # Cylinder270 placement: moved
    add(cylinder286_1.part.moved(Location((57, 5, 58))))


with BuildPart() as led_pt_holder:
    # Box001027045200 → Box001027045200 (new body)
    with BuildSketch(Plane(origin=(71, 1, 53), x_dir=(1, 0, 0), z_dir=(0, 0, 1))):
        with Locations((5, 4.5)):
            Rectangle(BOX001027045200_W, BOX001027045200_H)
    extrude(amount=BOX001027045200_DEPTH)

    # Chamfer015
    chamfer015_edges = [led_pt_holder.edges().sort_by_distance(p)[0] for p in [
        (71, 10, 58),
    ]]
    chamfer(chamfer015_edges, length=CHAMFER015_SIZE)


with BuildPart() as led_pt_holder_1:
    # Chamfer015 placement: moved
    add(led_pt_holder.part.moved(Location((-1.5, 0, 0))))

    # Chamfer016
    chamfer016_edges = [led_pt_holder_1.edges().sort_by_distance(p)[0] for p in [
        (69.5, 4.5, 63),
        (69.5, 4.5, 53),
    ]]
    chamfer(chamfer016_edges, length=CHAMFER016_SIZE)

    # Cut242: cut Cylinder286
    add(cylinder286_2.part, mode=Mode.SUBTRACT)

    # Cut243: cut Cylinder287
    add(cylinder287_2.part, mode=Mode.SUBTRACT)

    # Fillet046
    fillet046_edges = [led_pt_holder_1.edges().sort_by_distance(p)[0] for p in [
        (69.5, 4.5, 55),
        (69.5, 4.5, 61),
    ]]
    fillet(fillet046_edges, radius=FILLET046_R)

    # Cut244: cut Cylinder288
    add(cylinder288.part, mode=Mode.SUBTRACT)


with BuildPart() as part_mirroring018:
    # Part__Mirroring018: instance of led-pt-holder
    add(led_pt_holder_1.part.mirror(Plane(origin=(0, 0, 0), x_dir=(1, 0, 0), z_dir=(0, 1, 0))))


with BuildPart() as part_mirroring018_1:
    # Part__Mirroring018 placement: moved
    add(part_mirroring018.part.moved(Location((0, 30, -7))))


with BuildPart() as part_mirroring017:
    # Part__Mirroring017: instance of led-pt-holder
    add(led_pt_holder_1.part.mirror(Plane(origin=(0, 0, 0), x_dir=(1, 0, 0), z_dir=(0, 1, 0))))


with BuildPart() as part_mirroring017_1:
    # Part__Mirroring017 placement: moved
    add(part_mirroring017.part.moved(Location((0, 30, 19))))


with BuildPart() as led_holders:
    # Part__Mirroring016: instance of led-pt-holder
    add(led_pt_holder_1.part.mirror(Plane(origin=(0, 0, 0), x_dir=(1, 0, 0), z_dir=(0, 1, 0))))


with BuildPart() as led_holders_1:
    # Part__Mirroring016 placement: moved
    add(led_holders.part.moved(Location((0, 30, 0))))

    # Fusion112158: union Part__Mirroring018, Part__Mirroring017
    add(part_mirroring018_1.part)
    add(part_mirroring017_1.part)


with BuildPart() as led_holders_2:
    # Fusion112158 placement: moved
    add(led_holders_1.part.moved(Location((0, 4, 0))))

    # Fusion112160: union Cube250, Cube251
    add(cube250.part)
    add(cube251.part)


with BuildPart() as m3_studding027:
    # Cylinder275 → Cylinder275 (new body)
    with BuildSketch(Plane(origin=(14, 21, 0), x_dir=(1, 0, 0), z_dir=(0, 0, 1))):
        Circle(CYLINDER275_R)
    extrude(amount=CYLINDER275_DEPTH)


with BuildPart() as cube249:
    # Box001027045203 → Box001027045203 (new body)
    with BuildSketch(Plane(origin=(9, 10, 89), x_dir=(1, 0, 0), z_dir=(0, 0, 1))):
        with Locations((5, 7.5)):
            Rectangle(BOX001027045203_W, BOX001027045203_H)
    extrude(amount=BOX001027045203_DEPTH)


with BuildPart() as roller_track:
    # Box001027045202 → Box001027045202 (new body)
    with BuildSketch(Plane(origin=(9, 10, 101), x_dir=(1, 0, 0), z_dir=(0, 0, 1))):
        with Locations((34, 5)):
            Rectangle(BOX001027045202_W, BOX001027045202_H)
    extrude(amount=BOX001027045202_DEPTH)

    # Fusion112162: union Cube249
    add(cube249.part)

    # Cut251: cut m3-studding027
    add(m3_studding027.part, mode=Mode.SUBTRACT)

    # Fusion112163: union pin-strip-bracket, track-blank-f, Part__Mirroring020, led-holders
    add(pin_strip_bracket_2.part)
    add(track_blank_f.part)
    add(part_mirroring020_1.part)
    add(led_holders_2.part)


solid = roller_track.part
